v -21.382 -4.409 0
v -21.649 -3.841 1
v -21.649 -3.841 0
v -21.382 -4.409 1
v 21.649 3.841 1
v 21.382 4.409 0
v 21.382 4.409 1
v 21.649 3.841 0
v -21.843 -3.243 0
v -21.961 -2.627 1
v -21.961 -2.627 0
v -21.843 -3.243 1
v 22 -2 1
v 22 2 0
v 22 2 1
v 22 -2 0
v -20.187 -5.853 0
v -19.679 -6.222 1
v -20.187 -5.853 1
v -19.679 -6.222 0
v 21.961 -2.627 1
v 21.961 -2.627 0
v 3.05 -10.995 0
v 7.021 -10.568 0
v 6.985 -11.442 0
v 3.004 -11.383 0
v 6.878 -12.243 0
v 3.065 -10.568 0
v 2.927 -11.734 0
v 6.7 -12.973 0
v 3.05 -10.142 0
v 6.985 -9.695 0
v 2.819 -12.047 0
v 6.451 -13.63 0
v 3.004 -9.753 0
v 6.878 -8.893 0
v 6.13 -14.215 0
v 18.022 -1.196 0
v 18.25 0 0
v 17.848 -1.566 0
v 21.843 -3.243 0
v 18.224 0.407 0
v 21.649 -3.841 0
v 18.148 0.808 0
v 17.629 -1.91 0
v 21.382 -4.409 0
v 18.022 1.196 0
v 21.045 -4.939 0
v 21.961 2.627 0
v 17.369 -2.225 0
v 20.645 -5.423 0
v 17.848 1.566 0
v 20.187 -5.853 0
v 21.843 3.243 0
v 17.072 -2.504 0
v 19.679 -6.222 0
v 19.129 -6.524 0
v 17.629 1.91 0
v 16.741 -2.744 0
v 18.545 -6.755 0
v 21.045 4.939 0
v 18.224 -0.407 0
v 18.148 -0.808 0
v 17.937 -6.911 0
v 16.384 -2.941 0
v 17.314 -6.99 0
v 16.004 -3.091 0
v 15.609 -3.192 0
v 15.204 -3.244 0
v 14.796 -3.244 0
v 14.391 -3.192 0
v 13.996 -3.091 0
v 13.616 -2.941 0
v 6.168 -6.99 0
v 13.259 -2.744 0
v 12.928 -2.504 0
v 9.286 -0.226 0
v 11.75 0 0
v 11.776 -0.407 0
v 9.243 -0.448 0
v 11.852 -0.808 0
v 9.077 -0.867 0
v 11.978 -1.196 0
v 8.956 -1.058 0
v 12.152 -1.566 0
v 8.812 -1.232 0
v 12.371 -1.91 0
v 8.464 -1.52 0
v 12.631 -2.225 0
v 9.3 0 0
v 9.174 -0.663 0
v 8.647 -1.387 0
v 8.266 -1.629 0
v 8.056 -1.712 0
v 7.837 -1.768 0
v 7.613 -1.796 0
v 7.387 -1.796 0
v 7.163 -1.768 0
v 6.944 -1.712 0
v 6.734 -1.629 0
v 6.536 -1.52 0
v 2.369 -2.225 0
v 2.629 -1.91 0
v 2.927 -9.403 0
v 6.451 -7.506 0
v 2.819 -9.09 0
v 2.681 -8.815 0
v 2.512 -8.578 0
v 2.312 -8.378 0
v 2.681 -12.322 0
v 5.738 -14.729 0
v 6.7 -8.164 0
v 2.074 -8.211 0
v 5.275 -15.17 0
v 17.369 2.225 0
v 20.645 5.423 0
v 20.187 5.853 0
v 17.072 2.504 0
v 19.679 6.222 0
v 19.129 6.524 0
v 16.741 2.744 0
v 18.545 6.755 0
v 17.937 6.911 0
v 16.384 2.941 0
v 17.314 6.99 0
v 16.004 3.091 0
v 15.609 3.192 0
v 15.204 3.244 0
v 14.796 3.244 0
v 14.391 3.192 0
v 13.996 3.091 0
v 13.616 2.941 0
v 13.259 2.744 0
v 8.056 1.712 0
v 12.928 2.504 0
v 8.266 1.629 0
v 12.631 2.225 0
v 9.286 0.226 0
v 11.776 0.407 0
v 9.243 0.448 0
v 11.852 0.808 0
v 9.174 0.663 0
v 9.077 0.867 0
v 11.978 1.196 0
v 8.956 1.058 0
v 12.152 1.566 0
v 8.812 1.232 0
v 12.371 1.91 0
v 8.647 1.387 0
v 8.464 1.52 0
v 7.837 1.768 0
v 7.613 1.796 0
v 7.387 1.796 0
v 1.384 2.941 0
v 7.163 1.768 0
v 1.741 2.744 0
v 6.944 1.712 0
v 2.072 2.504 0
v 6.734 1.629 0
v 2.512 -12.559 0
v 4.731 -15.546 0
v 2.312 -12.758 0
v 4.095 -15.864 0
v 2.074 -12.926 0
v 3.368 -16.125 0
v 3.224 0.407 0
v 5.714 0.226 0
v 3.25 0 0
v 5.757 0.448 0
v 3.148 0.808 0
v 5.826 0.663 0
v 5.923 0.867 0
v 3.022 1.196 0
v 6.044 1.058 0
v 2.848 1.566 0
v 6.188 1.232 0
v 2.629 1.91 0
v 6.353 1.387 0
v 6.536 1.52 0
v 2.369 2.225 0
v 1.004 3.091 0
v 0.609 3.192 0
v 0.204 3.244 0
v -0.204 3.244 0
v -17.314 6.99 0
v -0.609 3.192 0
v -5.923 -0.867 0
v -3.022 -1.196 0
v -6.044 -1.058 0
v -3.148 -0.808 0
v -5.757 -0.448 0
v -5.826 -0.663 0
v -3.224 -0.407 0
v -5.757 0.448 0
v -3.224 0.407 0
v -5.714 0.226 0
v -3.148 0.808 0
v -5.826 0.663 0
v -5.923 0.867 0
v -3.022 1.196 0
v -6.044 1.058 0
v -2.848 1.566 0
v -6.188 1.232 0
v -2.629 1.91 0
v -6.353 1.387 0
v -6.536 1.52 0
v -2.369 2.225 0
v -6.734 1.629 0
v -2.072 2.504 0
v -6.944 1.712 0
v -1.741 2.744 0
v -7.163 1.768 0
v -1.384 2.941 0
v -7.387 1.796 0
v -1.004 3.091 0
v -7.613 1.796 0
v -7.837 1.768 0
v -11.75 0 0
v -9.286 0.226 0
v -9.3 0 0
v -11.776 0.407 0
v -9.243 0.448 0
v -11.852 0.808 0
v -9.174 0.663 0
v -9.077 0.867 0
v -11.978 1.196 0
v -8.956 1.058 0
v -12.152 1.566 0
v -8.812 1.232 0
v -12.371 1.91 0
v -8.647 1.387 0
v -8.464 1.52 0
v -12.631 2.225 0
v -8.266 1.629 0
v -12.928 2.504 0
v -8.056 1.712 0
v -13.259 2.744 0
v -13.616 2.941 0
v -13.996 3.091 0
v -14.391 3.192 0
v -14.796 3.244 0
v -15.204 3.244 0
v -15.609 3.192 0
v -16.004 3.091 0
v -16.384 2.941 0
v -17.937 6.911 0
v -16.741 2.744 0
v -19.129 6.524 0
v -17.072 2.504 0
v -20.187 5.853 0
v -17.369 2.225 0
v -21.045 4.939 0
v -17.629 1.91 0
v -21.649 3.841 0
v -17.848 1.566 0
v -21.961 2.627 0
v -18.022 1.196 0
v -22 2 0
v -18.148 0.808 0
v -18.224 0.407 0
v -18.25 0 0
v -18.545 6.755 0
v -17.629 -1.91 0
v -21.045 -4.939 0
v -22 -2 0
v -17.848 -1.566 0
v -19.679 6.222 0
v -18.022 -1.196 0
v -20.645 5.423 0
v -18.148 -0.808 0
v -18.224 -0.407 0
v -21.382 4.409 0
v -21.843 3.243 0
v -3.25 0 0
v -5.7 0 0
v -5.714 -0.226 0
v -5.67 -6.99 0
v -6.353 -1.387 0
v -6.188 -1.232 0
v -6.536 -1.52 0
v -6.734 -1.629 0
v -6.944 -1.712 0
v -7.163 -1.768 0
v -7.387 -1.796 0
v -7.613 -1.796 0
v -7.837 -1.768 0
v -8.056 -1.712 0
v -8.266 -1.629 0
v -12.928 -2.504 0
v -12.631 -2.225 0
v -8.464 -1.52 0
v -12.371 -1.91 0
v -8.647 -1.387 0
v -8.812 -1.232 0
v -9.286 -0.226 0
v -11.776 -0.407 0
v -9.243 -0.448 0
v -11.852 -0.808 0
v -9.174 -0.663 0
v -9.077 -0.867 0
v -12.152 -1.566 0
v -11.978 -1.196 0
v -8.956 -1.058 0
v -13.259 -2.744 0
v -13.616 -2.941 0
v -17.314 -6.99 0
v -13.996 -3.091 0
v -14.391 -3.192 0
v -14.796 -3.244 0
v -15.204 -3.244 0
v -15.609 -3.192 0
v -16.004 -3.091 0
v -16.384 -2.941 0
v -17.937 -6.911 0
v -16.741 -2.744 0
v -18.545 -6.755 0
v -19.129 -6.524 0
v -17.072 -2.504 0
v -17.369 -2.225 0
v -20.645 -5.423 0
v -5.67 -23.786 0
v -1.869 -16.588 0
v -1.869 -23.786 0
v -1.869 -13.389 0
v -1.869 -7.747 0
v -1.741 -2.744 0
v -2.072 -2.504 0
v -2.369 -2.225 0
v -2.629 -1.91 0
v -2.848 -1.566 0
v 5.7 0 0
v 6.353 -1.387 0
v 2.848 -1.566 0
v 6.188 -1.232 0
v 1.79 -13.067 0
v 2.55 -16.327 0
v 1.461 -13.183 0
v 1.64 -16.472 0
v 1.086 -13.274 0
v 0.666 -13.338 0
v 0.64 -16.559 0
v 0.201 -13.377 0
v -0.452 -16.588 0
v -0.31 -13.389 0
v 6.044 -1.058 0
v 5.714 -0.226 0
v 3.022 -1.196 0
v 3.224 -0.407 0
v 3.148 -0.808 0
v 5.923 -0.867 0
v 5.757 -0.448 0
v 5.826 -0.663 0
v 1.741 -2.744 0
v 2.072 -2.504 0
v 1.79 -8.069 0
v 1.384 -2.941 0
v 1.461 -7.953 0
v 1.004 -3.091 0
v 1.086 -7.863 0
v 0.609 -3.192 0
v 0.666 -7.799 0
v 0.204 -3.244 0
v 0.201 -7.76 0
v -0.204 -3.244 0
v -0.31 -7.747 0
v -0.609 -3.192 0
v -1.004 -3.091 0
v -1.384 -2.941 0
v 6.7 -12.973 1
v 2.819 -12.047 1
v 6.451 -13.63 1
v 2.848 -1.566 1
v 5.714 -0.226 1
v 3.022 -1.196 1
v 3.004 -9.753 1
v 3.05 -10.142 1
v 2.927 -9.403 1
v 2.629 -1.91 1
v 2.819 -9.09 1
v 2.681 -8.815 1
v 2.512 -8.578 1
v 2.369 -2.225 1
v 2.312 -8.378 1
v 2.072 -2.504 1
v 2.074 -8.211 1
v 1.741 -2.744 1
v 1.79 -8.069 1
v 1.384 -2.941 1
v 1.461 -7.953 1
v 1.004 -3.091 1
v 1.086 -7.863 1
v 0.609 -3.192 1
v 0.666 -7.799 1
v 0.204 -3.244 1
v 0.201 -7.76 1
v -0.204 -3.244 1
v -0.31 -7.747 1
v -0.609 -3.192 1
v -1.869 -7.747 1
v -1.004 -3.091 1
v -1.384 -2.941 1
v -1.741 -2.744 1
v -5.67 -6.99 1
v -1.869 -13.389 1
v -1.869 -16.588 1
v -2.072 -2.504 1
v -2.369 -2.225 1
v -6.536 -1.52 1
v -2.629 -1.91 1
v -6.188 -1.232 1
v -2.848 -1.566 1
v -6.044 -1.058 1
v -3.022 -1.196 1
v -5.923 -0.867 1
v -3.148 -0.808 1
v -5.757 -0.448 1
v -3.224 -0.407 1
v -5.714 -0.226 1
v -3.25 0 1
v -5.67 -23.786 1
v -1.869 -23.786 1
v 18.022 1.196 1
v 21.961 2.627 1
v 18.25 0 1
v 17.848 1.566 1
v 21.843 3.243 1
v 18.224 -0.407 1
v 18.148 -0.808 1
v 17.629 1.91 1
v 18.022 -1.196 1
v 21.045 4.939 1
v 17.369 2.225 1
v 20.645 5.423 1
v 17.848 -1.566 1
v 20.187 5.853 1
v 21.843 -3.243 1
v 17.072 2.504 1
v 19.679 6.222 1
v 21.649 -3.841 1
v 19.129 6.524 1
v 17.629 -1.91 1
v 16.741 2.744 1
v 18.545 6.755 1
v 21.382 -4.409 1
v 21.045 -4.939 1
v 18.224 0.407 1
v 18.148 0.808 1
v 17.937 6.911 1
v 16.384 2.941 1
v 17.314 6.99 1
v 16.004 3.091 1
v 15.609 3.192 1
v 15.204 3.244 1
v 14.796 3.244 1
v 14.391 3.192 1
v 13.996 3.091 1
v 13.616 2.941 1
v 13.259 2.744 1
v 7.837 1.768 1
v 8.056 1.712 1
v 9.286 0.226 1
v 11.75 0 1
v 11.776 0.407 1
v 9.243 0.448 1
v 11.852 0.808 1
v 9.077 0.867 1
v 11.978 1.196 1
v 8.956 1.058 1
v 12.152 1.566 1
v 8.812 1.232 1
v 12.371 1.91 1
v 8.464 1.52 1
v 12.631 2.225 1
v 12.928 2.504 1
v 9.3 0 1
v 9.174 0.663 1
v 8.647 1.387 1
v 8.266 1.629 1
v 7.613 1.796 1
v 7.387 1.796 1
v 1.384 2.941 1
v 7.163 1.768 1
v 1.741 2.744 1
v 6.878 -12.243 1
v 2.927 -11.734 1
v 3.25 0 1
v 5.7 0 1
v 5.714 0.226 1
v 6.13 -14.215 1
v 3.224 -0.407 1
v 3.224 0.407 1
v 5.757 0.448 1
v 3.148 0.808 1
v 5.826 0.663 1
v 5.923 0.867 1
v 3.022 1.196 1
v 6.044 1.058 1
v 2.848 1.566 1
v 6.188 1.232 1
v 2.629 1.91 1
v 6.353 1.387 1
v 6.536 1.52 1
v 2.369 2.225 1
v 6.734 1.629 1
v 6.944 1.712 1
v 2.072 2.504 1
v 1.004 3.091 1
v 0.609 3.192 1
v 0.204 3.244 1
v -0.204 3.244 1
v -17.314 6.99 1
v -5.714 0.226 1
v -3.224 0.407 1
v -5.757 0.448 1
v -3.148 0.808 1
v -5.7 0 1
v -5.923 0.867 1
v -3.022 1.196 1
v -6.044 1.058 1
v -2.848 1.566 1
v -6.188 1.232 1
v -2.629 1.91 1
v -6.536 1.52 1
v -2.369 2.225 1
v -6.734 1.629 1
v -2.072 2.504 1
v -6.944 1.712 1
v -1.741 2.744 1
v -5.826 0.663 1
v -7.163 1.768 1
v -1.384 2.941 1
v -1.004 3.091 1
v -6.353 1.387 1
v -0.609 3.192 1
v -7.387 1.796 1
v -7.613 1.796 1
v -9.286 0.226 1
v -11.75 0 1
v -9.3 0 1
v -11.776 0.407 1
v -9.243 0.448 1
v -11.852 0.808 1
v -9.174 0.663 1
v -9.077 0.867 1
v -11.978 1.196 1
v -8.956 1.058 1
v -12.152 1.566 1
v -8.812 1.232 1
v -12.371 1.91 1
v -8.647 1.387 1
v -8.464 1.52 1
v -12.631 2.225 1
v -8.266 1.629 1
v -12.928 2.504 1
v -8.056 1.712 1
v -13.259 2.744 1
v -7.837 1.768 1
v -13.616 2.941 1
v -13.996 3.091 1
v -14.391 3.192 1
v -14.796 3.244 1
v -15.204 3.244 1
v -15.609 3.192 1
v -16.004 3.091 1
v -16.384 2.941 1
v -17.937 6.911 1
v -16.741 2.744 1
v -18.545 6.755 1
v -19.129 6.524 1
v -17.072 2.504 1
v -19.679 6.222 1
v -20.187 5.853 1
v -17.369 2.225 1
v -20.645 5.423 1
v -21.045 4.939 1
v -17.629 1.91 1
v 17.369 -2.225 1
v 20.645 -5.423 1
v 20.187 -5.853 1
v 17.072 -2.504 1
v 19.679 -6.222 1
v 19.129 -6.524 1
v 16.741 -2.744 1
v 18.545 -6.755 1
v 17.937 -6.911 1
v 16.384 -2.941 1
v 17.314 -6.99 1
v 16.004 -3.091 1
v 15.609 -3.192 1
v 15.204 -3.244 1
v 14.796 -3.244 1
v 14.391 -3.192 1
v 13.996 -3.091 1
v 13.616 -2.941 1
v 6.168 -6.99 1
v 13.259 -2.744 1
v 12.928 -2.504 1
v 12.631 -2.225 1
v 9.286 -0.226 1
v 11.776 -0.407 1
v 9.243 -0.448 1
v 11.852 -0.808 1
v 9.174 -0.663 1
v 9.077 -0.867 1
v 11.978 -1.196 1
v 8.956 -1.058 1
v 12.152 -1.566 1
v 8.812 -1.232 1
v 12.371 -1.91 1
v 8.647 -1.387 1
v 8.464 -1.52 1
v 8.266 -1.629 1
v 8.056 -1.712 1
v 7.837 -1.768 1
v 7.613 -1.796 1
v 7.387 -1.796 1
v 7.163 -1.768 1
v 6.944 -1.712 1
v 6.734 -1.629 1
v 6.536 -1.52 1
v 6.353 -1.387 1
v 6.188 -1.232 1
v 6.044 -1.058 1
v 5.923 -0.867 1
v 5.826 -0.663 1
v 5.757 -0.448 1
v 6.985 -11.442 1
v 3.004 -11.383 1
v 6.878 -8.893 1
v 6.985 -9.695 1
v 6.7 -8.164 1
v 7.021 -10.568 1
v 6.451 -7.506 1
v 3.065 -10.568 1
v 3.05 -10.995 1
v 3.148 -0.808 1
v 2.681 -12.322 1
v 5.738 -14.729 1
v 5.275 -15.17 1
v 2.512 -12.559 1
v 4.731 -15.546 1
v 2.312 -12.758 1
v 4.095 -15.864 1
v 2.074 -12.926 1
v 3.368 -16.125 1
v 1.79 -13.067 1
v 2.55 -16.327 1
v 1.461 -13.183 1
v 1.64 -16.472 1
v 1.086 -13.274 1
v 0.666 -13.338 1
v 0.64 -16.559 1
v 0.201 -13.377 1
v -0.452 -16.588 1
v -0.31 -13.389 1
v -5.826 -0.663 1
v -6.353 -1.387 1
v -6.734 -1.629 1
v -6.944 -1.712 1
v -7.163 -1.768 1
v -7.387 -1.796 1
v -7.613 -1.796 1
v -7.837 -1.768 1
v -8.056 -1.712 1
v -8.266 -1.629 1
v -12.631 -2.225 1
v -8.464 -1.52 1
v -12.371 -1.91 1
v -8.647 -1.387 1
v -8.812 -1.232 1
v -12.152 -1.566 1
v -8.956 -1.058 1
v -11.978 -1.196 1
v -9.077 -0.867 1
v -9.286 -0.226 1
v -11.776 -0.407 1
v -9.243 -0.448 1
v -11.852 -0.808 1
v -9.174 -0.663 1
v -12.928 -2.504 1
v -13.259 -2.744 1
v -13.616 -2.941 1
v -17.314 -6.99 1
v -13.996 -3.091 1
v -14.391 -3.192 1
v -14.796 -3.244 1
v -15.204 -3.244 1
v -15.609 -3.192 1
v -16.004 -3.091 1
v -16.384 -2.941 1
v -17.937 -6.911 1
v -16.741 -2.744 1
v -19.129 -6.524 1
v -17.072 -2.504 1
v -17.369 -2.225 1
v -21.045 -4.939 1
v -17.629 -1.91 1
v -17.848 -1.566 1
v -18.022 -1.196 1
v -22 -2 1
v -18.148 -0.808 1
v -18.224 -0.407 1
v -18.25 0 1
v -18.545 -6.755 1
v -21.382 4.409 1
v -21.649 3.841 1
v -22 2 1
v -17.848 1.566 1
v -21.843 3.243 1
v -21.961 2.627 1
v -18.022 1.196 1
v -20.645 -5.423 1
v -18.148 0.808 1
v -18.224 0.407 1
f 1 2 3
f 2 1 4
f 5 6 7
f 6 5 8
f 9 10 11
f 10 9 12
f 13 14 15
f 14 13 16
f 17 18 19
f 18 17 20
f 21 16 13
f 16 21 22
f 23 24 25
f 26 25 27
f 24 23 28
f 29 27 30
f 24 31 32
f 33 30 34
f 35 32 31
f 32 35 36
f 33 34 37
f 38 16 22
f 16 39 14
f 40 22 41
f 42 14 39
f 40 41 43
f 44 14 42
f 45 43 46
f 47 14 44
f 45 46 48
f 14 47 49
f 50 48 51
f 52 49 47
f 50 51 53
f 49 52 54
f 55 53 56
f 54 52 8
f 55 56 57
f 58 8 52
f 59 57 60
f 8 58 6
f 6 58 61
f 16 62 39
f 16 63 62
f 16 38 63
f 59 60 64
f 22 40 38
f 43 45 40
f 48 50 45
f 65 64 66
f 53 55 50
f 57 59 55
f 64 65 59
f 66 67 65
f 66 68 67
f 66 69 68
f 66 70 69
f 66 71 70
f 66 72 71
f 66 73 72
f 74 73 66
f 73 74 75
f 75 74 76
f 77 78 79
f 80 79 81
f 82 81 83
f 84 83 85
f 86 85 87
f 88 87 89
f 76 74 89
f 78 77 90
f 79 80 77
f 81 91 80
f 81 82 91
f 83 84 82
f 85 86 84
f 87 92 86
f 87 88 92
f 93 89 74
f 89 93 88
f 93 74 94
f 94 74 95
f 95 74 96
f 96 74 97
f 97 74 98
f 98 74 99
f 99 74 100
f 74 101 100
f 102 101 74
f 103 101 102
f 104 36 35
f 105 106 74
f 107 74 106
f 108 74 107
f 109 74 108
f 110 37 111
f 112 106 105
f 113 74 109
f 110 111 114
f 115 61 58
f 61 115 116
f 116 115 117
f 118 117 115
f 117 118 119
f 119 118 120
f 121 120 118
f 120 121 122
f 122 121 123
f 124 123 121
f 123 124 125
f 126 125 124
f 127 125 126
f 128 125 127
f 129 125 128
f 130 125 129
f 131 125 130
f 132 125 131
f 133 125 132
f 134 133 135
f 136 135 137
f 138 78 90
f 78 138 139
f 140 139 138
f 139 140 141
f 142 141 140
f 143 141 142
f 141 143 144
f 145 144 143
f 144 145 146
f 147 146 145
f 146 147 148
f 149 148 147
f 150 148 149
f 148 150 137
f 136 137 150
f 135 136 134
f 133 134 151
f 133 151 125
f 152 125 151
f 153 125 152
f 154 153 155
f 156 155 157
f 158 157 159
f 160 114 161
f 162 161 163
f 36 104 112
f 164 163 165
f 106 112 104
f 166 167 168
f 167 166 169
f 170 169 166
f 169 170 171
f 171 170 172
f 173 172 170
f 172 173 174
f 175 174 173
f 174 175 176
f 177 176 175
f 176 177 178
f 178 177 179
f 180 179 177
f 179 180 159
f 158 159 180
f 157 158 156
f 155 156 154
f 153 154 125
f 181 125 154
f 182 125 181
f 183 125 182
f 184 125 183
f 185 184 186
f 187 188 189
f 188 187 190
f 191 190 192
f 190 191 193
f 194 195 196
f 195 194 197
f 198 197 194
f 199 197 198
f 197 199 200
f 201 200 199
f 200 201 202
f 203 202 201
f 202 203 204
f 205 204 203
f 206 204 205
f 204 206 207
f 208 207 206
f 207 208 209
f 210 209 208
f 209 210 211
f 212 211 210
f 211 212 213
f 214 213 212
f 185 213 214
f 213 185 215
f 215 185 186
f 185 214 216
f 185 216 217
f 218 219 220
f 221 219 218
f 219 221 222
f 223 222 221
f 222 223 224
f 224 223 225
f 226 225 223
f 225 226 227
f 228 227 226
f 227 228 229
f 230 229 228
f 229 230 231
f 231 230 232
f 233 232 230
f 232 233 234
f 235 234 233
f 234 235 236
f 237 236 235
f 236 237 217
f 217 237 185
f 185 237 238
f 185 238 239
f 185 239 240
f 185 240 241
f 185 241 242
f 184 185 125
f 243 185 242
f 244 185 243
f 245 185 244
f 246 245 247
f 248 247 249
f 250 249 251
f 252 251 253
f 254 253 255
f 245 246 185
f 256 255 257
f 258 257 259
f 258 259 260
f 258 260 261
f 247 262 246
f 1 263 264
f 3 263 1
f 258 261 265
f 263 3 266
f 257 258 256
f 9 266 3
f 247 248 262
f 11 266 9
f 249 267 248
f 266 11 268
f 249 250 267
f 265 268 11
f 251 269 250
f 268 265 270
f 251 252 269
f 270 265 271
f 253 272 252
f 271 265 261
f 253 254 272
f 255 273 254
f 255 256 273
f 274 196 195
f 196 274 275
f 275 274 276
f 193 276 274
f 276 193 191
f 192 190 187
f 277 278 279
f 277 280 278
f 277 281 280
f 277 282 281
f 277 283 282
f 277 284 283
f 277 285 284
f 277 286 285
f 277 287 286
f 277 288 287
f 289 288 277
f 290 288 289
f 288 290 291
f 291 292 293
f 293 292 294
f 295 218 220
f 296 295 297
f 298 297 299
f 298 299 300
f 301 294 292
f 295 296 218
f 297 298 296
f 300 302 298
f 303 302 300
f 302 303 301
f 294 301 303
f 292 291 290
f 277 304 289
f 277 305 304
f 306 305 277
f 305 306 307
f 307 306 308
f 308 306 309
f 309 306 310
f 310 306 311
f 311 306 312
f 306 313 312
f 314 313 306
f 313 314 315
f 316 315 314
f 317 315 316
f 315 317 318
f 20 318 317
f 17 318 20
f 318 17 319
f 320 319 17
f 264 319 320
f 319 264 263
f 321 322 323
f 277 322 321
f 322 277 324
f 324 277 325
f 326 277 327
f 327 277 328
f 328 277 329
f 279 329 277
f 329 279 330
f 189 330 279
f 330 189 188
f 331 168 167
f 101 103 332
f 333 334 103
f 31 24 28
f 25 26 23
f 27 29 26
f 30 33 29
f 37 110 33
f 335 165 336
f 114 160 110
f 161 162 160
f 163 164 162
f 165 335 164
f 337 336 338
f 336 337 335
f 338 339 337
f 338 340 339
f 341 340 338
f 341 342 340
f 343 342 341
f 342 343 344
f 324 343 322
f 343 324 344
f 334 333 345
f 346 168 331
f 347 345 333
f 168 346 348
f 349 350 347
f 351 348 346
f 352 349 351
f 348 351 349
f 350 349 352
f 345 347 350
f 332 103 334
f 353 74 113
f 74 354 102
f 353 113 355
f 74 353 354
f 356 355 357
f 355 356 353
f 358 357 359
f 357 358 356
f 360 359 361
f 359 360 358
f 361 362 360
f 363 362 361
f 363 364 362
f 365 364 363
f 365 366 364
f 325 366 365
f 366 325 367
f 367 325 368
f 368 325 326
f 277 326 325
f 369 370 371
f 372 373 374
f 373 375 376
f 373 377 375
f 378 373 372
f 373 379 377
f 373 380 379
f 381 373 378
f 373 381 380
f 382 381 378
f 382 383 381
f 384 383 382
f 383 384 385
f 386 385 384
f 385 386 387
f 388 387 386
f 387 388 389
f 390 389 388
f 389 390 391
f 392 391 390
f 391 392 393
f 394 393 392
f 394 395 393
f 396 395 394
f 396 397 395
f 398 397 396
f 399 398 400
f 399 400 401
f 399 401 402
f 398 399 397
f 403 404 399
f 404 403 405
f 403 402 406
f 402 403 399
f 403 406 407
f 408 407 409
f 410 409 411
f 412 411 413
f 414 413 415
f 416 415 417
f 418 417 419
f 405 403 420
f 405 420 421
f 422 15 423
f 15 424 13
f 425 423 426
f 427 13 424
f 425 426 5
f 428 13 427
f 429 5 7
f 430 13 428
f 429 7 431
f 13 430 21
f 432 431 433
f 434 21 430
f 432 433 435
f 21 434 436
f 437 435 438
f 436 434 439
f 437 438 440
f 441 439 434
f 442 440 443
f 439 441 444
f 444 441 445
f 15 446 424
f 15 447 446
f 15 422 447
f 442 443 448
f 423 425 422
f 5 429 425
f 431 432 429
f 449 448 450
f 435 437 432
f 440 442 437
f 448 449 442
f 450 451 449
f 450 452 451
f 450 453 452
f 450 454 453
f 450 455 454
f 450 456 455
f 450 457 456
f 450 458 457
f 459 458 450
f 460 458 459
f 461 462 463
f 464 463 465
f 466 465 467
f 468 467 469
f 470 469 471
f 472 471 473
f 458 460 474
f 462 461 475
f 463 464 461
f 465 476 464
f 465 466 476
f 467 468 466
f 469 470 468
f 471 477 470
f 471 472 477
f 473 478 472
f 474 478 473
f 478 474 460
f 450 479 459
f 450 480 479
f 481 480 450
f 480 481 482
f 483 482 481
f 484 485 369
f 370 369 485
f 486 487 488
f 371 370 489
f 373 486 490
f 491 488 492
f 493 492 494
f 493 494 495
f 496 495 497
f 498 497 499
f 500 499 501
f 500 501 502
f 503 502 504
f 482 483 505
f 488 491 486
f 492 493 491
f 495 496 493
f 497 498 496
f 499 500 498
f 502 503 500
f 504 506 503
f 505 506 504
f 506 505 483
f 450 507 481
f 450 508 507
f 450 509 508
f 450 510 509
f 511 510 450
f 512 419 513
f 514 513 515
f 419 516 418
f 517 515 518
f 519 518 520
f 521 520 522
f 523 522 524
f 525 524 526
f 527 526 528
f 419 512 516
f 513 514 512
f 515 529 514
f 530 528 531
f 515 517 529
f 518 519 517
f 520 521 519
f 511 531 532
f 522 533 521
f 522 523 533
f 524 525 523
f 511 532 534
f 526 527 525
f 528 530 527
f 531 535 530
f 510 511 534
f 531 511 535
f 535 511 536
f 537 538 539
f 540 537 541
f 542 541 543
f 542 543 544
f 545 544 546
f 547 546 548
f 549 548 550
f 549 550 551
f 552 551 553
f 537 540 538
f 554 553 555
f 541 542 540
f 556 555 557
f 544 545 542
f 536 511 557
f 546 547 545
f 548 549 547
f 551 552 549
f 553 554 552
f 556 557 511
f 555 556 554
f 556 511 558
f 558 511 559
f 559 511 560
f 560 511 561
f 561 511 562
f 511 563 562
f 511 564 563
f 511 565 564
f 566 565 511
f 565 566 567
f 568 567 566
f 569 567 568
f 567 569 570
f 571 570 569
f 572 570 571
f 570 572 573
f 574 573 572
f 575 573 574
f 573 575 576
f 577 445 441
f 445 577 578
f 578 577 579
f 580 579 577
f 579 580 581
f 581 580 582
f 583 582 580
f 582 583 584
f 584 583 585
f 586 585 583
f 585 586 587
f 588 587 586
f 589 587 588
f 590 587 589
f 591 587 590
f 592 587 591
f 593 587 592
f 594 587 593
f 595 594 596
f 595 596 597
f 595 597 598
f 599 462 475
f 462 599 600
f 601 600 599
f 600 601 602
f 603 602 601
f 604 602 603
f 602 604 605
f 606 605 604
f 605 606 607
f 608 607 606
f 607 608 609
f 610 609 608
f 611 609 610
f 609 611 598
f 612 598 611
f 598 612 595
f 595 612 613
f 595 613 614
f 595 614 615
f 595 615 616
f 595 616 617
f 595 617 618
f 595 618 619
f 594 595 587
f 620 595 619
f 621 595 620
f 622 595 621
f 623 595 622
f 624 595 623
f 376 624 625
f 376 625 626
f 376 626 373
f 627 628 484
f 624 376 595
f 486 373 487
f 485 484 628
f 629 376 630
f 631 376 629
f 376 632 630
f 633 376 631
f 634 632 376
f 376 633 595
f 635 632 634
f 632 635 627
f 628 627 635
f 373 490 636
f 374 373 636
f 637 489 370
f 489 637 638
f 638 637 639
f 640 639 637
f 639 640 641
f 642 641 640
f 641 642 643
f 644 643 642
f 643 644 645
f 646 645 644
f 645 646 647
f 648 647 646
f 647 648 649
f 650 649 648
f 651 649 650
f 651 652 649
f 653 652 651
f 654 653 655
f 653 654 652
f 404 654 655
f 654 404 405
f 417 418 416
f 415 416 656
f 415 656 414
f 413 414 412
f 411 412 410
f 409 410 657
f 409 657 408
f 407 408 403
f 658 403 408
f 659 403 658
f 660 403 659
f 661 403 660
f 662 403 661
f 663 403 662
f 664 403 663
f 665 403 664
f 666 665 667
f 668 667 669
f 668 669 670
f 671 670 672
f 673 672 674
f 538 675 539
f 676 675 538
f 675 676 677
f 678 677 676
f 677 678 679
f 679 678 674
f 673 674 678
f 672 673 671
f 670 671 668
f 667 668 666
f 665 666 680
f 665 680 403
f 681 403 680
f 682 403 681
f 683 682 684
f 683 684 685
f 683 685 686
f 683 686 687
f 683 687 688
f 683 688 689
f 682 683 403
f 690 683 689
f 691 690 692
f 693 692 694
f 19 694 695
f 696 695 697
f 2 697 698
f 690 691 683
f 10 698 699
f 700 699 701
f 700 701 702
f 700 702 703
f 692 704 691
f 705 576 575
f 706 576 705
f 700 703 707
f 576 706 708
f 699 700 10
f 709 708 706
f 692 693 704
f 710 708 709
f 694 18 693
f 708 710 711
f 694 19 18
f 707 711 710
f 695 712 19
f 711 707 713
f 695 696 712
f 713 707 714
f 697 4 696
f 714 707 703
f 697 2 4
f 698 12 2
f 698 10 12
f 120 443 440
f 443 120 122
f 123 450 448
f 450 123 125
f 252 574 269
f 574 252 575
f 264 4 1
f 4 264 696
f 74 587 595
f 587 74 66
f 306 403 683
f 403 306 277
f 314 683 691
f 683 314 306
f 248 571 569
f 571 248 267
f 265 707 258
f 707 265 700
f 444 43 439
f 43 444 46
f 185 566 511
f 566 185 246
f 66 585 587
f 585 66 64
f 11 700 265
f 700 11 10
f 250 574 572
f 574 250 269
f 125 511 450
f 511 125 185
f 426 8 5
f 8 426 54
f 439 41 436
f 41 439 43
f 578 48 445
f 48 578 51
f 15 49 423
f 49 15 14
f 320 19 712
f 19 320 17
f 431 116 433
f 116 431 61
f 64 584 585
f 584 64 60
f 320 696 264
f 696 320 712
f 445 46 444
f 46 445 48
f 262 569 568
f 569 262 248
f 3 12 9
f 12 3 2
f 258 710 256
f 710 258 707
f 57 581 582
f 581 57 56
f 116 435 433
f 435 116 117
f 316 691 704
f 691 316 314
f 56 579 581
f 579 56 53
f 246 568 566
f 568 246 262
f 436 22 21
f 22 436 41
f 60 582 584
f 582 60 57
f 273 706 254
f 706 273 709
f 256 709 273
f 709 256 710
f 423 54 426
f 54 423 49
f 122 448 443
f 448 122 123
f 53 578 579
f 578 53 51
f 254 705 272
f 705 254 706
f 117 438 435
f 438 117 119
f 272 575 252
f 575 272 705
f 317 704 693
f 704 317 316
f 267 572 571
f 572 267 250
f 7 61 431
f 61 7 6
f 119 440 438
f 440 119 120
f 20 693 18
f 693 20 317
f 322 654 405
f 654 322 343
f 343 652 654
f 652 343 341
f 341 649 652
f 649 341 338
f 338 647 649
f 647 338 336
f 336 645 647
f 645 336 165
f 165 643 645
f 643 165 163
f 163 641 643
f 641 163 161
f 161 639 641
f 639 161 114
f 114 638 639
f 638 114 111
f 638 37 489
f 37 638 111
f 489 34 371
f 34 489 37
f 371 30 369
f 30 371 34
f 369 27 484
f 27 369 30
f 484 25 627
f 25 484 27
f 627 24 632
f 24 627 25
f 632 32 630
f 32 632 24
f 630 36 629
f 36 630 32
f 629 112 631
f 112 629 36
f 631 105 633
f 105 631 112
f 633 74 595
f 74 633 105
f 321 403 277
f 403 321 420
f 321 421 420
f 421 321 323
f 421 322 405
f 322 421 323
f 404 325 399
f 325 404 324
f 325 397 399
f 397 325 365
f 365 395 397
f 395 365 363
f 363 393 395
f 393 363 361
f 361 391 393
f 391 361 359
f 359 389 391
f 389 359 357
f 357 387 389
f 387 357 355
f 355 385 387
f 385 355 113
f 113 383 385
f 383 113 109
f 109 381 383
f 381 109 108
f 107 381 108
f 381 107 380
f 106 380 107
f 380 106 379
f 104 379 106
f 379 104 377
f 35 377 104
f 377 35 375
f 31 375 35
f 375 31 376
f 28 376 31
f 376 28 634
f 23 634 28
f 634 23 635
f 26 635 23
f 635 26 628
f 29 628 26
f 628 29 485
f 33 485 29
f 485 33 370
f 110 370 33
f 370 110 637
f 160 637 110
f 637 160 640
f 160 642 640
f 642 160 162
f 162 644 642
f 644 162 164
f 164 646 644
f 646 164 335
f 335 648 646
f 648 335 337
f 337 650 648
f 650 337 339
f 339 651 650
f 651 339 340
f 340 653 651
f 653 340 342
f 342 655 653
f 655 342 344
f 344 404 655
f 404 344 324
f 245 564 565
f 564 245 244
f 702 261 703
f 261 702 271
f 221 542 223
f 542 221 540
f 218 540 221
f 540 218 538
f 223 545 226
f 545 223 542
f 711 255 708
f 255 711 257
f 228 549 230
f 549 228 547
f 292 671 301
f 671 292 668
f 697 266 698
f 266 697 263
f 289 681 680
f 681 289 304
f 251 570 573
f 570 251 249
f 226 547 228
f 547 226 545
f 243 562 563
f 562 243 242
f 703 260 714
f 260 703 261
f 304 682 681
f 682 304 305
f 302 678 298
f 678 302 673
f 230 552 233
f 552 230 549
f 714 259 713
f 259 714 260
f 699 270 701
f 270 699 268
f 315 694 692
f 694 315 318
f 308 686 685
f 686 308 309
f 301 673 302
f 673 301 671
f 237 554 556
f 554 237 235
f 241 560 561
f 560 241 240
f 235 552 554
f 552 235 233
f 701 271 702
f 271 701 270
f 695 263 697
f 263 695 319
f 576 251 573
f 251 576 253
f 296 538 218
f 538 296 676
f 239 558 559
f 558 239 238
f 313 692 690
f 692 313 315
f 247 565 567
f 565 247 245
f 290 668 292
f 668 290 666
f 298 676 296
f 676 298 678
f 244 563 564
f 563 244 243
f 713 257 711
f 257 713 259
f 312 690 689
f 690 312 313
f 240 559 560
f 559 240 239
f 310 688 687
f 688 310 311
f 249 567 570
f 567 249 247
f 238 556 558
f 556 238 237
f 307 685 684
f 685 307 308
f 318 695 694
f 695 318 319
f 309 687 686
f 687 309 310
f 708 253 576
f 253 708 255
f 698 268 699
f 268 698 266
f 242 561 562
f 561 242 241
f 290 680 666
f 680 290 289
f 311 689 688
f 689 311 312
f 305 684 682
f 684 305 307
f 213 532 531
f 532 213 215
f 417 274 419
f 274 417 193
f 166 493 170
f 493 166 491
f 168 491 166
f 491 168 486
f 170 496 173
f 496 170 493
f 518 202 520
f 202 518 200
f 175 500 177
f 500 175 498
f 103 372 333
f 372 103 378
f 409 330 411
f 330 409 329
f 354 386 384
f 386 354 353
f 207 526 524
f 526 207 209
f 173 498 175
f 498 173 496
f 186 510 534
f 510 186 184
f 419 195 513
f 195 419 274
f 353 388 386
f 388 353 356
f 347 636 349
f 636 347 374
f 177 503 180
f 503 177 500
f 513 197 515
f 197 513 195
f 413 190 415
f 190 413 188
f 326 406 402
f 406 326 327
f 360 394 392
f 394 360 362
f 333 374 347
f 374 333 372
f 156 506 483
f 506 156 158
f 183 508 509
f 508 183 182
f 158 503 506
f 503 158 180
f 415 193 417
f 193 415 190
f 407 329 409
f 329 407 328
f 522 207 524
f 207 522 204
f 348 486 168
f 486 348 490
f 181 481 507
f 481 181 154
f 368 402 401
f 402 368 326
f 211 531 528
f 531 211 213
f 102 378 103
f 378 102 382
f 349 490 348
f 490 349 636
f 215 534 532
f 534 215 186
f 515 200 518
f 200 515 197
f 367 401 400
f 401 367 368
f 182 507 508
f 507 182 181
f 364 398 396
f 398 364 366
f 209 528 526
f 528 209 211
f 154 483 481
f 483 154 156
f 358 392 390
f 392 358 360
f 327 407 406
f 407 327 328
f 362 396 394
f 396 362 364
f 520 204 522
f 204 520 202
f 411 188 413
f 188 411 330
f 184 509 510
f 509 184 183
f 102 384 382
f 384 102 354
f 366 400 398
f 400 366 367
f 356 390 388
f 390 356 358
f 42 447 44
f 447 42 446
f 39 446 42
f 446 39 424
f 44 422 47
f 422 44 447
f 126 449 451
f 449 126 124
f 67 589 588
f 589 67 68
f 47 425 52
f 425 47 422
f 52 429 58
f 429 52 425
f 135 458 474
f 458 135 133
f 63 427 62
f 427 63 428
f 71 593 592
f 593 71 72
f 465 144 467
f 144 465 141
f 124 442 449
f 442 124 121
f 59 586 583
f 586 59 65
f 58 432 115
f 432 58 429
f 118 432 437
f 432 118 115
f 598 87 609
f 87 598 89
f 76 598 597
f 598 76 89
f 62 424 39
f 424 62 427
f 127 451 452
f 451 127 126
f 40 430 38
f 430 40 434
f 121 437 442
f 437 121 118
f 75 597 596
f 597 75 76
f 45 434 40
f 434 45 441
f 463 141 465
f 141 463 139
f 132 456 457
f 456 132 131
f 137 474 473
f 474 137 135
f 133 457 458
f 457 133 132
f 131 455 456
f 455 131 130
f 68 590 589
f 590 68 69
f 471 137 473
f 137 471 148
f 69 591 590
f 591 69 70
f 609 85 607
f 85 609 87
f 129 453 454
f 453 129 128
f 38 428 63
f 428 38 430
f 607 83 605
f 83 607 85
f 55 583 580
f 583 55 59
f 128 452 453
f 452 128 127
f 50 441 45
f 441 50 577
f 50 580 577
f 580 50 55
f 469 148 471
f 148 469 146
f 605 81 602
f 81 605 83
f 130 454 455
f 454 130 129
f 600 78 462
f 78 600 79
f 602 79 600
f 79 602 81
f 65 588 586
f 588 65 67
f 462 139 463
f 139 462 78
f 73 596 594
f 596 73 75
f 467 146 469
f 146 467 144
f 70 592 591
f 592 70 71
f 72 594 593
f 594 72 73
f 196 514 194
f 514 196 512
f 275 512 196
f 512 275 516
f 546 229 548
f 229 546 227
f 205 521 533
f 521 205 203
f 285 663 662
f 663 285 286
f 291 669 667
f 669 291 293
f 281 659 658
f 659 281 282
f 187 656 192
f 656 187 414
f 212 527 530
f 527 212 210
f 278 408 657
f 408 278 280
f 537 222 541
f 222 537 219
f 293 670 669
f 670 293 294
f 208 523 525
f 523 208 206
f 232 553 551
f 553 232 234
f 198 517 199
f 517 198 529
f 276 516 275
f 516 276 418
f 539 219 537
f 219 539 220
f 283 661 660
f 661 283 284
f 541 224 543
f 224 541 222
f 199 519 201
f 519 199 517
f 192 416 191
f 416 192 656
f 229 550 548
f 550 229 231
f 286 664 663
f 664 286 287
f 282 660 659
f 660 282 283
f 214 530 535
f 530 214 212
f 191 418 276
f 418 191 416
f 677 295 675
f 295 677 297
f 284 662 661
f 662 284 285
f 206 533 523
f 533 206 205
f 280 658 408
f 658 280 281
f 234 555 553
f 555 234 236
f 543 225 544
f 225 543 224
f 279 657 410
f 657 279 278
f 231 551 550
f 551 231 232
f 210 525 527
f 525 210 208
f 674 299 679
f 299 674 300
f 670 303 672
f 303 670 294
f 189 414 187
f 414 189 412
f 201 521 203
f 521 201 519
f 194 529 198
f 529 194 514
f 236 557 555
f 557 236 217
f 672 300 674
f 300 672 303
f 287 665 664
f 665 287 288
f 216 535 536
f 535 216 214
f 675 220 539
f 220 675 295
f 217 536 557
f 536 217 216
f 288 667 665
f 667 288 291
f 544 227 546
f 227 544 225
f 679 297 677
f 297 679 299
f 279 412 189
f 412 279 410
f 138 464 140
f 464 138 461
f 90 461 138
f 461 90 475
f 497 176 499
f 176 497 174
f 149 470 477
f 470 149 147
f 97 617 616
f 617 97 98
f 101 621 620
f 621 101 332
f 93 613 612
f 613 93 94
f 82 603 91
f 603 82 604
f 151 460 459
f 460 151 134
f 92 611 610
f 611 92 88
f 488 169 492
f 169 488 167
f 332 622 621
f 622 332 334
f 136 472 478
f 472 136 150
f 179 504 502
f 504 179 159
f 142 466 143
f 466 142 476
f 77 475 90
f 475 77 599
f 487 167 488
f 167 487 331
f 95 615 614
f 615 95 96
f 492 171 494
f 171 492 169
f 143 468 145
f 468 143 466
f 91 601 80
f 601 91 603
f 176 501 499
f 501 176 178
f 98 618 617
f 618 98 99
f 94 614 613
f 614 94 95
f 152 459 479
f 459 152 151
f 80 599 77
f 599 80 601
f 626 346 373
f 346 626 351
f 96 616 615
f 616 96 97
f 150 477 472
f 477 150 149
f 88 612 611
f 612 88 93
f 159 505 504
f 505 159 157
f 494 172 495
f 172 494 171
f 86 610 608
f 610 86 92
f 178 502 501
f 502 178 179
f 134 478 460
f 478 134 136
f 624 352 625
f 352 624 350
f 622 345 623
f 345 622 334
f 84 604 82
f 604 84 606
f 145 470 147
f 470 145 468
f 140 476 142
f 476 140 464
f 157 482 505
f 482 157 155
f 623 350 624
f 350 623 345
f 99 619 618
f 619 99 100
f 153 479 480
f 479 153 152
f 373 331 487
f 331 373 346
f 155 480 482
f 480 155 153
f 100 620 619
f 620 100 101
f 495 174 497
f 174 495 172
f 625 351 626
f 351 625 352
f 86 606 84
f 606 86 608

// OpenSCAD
$fn = 50;


difference() {
	union() {
		hull() {
			translate(v = [-17.0000000000, 2.0000000000, 0]) {
				cylinder(h = 1, r = 5);
			}
			translate(v = [17.0000000000, 2.0000000000, 0]) {
				cylinder(h = 1, r = 5);
			}
			translate(v = [-17.0000000000, -2.0000000000, 0]) {
				cylinder(h = 1, r = 5);
			}
			translate(v = [17.0000000000, -2.0000000000, 0]) {
				cylinder(h = 1, r = 5);
			}
		}
		translate(v = [0, -5, 0]) {
			linear_extrude(height = 1) {
				text(font = "DejaVu Sans Mono:style=Bold", halign = "center", size = 19.0000000000, text = "P", valign = "top");
			}
		}
	}
	union() {
		translate(v = [-15.0000000000, 0.0000000000, 0]) {
			translate(v = [0, 0, -100]) {
				cylinder(h = 200, r = 3.2500000000);
			}
		}
		translate(v = [0, 0, -100]) {
			cylinder(h = 200, r = 3.2500000000);
		}
		translate(v = [15.0000000000, 0.0000000000, 0]) {
			translate(v = [0, 0, -100]) {
				cylinder(h = 200, r = 3.2500000000);
			}
		}
		translate(v = [-15.0000000000, 0.0000000000, 0]) {
			translate(v = [0, 0, -100]) {
				cylinder(h = 200, r = 1.8000000000);
			}
		}
		translate(v = [-7.5000000000, 0.0000000000, 0]) {
			translate(v = [0, 0, -100]) {
				cylinder(h = 200, r = 1.8000000000);
			}
		}
		translate(v = [0, 0, -100]) {
			cylinder(h = 200, r = 1.8000000000);
		}
		translate(v = [7.5000000000, 0.0000000000, 0]) {
			translate(v = [0, 0, -100]) {
				cylinder(h = 200, r = 1.8000000000);
			}
		}
		translate(v = [15.0000000000, 0.0000000000, 0]) {
			translate(v = [0, 0, -100]) {
				cylinder(h = 200, r = 1.8000000000);
			}
		}
	}
}
